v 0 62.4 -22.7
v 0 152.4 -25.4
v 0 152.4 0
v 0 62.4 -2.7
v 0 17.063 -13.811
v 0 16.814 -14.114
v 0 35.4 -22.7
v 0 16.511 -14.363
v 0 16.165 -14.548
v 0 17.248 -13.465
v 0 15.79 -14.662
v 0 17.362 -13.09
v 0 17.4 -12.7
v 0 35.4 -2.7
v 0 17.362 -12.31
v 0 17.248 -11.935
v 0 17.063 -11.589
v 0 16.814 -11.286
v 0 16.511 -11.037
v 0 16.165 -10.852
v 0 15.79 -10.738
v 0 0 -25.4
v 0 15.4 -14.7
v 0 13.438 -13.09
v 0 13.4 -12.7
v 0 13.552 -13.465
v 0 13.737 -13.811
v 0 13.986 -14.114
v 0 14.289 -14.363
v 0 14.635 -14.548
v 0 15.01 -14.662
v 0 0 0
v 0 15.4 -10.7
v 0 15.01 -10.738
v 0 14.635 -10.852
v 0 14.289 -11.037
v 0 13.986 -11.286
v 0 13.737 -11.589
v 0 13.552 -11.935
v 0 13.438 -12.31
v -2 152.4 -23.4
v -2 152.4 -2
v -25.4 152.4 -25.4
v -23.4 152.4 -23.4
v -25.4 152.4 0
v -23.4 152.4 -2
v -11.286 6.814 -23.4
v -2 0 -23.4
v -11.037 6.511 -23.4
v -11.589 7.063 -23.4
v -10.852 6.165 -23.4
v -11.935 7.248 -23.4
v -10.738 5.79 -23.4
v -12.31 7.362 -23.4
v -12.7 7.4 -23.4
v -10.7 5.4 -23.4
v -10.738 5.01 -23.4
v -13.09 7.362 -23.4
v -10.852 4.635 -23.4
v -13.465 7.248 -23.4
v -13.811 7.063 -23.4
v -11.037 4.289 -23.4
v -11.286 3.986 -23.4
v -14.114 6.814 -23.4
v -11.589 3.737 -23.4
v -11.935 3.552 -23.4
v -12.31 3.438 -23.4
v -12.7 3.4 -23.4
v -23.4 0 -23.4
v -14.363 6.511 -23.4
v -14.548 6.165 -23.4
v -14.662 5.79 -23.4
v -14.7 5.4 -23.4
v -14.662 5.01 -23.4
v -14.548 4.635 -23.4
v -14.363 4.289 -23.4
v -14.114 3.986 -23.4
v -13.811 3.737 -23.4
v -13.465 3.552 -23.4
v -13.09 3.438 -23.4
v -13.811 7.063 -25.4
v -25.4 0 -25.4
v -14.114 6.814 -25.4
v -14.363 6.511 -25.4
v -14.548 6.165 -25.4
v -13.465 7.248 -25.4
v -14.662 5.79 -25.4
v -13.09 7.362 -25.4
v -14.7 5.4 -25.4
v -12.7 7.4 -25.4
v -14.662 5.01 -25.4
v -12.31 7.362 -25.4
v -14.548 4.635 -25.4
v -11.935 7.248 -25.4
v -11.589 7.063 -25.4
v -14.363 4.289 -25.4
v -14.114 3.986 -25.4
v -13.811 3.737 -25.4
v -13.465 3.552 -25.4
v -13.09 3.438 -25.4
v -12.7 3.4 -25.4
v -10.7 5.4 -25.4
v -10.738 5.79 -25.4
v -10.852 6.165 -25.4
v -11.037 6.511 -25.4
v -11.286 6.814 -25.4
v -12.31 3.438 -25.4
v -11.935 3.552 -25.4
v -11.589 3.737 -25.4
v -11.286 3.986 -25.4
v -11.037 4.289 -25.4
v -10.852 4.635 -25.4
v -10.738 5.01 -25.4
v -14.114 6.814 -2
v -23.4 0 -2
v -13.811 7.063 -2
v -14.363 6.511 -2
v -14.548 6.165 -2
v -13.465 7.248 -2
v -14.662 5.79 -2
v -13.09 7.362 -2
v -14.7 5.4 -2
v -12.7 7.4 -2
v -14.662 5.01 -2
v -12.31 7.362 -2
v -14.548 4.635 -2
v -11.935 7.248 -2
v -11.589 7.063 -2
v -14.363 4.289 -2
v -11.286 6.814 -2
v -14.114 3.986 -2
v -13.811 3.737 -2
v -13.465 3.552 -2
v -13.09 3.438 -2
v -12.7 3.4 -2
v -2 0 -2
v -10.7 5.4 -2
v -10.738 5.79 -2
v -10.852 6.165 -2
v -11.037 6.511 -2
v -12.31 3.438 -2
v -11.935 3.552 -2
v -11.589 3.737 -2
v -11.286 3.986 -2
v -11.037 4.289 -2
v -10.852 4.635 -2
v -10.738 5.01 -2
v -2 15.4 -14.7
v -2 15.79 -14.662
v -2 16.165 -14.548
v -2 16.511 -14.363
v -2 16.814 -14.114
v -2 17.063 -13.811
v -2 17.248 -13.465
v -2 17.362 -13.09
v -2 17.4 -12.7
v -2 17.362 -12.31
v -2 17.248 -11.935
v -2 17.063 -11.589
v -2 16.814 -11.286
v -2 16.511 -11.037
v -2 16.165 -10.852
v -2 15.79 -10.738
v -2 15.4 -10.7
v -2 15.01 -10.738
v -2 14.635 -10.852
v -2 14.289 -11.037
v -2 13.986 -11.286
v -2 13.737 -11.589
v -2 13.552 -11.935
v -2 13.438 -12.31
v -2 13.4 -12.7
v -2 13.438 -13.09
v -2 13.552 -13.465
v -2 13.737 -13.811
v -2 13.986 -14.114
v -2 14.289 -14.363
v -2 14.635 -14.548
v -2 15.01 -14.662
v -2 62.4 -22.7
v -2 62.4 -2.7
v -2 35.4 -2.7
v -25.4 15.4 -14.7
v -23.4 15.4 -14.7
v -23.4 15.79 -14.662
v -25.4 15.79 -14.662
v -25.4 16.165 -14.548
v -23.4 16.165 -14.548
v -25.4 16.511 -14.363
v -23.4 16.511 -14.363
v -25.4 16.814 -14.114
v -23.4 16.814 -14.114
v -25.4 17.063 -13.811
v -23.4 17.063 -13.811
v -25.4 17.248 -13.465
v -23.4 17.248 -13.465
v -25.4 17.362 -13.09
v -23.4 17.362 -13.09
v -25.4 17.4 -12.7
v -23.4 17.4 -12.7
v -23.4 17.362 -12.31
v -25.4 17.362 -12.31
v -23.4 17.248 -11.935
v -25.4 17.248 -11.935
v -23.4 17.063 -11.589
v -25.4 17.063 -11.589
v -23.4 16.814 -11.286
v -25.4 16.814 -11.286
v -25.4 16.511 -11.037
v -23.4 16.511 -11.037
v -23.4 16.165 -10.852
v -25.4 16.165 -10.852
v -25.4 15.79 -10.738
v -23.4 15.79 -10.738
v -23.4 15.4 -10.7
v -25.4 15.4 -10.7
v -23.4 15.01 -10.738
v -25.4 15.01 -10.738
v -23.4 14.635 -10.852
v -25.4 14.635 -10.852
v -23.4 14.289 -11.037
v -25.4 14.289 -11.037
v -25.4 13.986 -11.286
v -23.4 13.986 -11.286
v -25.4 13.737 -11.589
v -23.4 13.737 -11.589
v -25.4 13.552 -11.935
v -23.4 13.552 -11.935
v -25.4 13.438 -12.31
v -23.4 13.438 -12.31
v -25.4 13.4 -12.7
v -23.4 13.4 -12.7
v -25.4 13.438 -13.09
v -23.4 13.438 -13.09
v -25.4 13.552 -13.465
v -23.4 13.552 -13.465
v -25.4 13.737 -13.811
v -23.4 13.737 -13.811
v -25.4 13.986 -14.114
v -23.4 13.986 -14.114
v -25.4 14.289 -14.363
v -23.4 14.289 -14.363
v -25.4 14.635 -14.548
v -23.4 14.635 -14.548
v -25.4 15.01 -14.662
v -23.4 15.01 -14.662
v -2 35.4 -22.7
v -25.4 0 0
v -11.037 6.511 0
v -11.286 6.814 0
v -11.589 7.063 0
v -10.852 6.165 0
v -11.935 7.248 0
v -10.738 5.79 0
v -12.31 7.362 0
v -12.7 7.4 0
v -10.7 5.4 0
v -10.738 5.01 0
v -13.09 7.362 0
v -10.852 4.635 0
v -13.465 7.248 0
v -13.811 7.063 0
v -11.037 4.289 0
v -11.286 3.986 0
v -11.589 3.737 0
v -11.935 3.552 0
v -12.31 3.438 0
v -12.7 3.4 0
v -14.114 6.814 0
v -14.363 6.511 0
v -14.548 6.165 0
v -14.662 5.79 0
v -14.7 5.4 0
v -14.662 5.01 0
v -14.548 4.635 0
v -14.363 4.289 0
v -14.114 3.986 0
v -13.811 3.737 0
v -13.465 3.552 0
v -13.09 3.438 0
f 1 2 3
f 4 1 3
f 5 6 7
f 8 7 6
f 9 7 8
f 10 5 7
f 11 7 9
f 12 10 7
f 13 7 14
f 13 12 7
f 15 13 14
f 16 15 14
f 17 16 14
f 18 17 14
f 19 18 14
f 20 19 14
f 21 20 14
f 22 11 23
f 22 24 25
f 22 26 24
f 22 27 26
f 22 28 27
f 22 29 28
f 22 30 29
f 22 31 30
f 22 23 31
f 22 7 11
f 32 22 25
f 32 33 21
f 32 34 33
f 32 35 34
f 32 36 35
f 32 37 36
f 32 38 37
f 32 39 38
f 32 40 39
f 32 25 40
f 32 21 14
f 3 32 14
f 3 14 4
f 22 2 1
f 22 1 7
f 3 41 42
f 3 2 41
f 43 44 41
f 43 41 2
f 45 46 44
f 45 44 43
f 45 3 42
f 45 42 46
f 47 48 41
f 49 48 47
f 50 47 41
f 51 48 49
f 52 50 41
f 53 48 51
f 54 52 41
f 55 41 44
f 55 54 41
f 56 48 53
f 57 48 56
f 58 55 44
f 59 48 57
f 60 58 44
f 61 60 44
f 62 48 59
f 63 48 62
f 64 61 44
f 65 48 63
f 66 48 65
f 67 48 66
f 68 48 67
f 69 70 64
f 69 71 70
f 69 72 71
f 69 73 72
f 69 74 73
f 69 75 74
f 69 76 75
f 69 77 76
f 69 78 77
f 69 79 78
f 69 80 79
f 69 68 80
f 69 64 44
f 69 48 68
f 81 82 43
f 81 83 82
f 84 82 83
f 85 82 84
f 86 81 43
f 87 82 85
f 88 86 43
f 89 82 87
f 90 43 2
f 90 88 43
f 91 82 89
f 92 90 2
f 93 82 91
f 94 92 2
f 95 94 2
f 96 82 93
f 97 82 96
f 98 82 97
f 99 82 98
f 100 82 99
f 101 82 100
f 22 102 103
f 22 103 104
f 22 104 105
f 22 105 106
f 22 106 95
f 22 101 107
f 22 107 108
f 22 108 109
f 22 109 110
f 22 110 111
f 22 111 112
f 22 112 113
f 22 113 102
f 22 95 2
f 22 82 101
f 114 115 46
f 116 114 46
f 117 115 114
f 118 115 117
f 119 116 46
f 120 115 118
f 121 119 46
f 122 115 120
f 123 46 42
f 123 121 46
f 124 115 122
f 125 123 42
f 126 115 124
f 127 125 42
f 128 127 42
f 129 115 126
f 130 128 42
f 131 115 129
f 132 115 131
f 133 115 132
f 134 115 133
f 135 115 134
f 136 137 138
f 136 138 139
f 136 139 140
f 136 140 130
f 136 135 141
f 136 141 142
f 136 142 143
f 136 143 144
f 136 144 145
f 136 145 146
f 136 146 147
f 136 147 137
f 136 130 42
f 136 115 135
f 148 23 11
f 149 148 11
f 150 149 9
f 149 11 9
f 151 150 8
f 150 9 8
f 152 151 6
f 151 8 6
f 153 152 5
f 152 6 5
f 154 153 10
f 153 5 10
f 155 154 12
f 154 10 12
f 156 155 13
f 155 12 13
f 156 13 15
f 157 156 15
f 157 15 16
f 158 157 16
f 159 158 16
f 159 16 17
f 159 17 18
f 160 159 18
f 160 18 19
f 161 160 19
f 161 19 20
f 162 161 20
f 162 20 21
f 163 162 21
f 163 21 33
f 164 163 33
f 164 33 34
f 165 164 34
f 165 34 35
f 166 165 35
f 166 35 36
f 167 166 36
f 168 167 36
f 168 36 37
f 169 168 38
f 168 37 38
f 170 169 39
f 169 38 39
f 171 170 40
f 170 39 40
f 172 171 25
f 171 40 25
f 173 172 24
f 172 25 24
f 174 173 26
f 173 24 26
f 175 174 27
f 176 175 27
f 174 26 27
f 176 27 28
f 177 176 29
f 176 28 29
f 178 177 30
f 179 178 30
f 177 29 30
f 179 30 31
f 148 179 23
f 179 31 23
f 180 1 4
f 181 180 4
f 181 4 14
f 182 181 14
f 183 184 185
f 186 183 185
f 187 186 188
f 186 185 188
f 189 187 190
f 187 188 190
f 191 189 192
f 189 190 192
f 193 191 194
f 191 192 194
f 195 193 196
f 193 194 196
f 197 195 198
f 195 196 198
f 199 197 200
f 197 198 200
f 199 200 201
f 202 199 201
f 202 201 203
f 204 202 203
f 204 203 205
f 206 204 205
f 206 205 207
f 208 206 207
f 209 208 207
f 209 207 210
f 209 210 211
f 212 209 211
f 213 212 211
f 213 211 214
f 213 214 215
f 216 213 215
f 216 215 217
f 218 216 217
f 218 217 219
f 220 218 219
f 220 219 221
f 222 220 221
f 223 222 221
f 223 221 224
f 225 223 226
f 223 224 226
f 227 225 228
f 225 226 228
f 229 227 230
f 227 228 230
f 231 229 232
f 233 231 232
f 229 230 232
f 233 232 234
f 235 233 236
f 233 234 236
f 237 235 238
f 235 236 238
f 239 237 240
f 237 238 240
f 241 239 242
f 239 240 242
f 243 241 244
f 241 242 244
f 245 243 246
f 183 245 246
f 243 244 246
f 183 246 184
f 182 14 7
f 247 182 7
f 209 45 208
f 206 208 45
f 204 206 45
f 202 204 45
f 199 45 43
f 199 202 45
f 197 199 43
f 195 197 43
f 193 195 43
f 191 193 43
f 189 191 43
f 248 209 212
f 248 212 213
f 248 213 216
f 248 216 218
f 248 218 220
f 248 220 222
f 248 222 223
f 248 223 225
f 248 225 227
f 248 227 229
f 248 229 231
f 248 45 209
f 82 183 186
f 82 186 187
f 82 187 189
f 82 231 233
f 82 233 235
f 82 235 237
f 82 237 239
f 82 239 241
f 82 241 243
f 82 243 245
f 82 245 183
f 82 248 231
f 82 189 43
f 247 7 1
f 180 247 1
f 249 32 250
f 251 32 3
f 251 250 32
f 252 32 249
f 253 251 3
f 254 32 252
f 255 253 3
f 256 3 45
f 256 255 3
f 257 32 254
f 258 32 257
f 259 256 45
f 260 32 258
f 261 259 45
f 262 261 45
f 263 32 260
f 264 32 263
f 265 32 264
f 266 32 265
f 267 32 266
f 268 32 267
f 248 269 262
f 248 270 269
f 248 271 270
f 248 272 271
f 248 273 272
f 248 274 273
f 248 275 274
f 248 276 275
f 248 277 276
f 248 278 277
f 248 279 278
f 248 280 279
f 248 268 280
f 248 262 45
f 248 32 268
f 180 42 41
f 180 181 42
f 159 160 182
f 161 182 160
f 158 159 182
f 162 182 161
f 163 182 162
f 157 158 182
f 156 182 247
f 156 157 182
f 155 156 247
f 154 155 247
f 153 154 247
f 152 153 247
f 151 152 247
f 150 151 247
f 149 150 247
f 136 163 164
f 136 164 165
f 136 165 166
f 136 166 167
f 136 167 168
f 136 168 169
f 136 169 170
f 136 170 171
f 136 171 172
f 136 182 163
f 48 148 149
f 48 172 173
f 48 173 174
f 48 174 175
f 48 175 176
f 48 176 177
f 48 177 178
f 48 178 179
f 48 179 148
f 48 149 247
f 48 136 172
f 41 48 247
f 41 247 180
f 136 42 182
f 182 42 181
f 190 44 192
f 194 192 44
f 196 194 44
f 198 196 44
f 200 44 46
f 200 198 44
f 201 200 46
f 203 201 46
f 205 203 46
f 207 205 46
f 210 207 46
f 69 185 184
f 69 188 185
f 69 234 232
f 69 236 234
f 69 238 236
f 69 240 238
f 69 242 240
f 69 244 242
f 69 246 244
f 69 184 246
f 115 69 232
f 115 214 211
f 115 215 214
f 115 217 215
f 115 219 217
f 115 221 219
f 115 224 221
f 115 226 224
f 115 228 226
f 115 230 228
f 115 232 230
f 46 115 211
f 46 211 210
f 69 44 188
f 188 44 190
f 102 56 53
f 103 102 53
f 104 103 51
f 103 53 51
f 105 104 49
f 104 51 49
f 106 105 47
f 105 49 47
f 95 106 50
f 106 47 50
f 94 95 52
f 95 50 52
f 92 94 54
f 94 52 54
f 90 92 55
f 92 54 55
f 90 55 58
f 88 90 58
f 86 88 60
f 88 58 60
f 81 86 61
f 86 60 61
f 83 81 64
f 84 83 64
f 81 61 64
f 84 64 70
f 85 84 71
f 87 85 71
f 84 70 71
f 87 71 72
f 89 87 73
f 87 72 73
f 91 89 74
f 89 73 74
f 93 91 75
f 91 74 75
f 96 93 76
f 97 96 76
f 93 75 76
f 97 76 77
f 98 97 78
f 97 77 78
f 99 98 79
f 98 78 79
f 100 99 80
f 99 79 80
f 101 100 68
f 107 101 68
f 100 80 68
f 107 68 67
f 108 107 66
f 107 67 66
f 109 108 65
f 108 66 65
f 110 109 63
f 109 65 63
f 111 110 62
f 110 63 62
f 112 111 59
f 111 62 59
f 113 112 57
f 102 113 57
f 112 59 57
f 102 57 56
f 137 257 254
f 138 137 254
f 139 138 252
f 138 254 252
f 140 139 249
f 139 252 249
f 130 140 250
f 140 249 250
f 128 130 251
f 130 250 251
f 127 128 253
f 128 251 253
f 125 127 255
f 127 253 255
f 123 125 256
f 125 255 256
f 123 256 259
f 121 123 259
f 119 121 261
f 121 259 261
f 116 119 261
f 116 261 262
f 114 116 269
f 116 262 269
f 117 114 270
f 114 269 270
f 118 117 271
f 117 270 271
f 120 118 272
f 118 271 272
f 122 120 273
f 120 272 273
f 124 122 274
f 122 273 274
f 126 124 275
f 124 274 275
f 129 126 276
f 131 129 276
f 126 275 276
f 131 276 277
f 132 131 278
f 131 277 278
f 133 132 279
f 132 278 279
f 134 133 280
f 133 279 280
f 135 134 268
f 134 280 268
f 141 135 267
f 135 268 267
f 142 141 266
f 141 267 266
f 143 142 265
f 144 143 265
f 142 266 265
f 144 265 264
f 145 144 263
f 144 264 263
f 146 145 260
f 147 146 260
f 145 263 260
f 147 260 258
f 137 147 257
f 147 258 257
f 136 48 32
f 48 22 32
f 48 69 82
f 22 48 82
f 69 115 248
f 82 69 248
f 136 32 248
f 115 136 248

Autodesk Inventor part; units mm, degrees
ref_plane "YZ Plane" through (0, 0, 0) normal (1, 0, 0) x (0, 1, 0)
ref_plane "XZ Plane" through (0, 0, 0) normal (0, 1, 0) x (-1, 0, 0)
ref_plane "XY Plane" through (0, 0, 0) normal (0, 0, 1) x (1, 0, 0)
sketch "Sketch1" plane through (0, 0, 0) normal (0, 1, 0) x (-1, 0, 0)
  line L0 (0, 0) -> (25.4, 0)
  line L1 (25.4, 0) -> (25.4, -25.4)
  line L2 (25.4, -25.4) -> (0, -25.4)
  line L3 (0, -25.4) -> (0, 0)
  line L4 (23.4, -23.4) -> (23.4, -2)
  line L5 (23.4, -2) -> (2, -2)
  line L6 (2, -2) -> (2, -23.4)
  line L7 (2, -23.4) -> (23.4, -23.4)
  dimension "d0" = 25.4
  dimension "d1" = 25.4
  dimension "d2" = 2
extrude "Extrusion1" add sketch "Sketch1" along normal blind 152.4
sketch "Sketch2" plane through (-25.4, 0, 0) normal (0, 0, 1) x (1, 0, 0)
  line L0 (25.4, 0) -> (0, 0) projected
  circle A0 centre (12.7, 5.4) radius 2
  dimension "d6" = 4
extrude "Extrusion2" cut sketch "Sketch2" against normal through all
sketch "Sketch3" plane through (0, 0, 0) normal (1, 0, 0) x (0, 0, -1)
  line L0 (0, 0) -> (25.4, 0) projected
  circle A0 centre (12.7, 15.4) radius 2
  dimension "d10" = 4
extrude "Extrusion3" cut sketch "Sketch3" against normal through all
sketch "Sketch4" plane through (0, 0, 0) normal (1, 0, 0) x (0, 0, -1)
  line L0 (23.4, 0) -> (2, 0) projected
  line L1 (12.7, 35.4) -> (22.7, 35.4)
  line L2 (22.7, 35.4) -> (22.7, 62.4)
  line L3 (23.4, 0) -> (23.4, 152.4) projected
  line L4 (22.7, 62.4) -> (2.7, 62.4)
  line L5 (2.7, 62.4) -> (2.7, 35.4)
  line L6 (2.7, 35.4) -> (12.7, 35.4)
  point P0 (0, 0)
  dimension "d15" = 10
  dimension "d16" = 20
extrude "Extrusion4" cut sketch "Sketch4" against normal blind 10
properties part number "Metal_Bone"
